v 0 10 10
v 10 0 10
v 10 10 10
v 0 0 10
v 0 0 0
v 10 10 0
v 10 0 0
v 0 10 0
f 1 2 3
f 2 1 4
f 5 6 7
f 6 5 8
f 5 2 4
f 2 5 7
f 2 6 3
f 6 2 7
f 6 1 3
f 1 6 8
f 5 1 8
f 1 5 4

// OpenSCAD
// 用于 studio-web Phase 6 smoke 的最小 cube 预览样例。
// web 端不允许通过 FileRead 读取 .scad 源码（保密边界），split viewer
// 源码面会显示拒绝消息；预览面走 PreviewRequest，由 server 处理。
cube([10, 10, 10]);
